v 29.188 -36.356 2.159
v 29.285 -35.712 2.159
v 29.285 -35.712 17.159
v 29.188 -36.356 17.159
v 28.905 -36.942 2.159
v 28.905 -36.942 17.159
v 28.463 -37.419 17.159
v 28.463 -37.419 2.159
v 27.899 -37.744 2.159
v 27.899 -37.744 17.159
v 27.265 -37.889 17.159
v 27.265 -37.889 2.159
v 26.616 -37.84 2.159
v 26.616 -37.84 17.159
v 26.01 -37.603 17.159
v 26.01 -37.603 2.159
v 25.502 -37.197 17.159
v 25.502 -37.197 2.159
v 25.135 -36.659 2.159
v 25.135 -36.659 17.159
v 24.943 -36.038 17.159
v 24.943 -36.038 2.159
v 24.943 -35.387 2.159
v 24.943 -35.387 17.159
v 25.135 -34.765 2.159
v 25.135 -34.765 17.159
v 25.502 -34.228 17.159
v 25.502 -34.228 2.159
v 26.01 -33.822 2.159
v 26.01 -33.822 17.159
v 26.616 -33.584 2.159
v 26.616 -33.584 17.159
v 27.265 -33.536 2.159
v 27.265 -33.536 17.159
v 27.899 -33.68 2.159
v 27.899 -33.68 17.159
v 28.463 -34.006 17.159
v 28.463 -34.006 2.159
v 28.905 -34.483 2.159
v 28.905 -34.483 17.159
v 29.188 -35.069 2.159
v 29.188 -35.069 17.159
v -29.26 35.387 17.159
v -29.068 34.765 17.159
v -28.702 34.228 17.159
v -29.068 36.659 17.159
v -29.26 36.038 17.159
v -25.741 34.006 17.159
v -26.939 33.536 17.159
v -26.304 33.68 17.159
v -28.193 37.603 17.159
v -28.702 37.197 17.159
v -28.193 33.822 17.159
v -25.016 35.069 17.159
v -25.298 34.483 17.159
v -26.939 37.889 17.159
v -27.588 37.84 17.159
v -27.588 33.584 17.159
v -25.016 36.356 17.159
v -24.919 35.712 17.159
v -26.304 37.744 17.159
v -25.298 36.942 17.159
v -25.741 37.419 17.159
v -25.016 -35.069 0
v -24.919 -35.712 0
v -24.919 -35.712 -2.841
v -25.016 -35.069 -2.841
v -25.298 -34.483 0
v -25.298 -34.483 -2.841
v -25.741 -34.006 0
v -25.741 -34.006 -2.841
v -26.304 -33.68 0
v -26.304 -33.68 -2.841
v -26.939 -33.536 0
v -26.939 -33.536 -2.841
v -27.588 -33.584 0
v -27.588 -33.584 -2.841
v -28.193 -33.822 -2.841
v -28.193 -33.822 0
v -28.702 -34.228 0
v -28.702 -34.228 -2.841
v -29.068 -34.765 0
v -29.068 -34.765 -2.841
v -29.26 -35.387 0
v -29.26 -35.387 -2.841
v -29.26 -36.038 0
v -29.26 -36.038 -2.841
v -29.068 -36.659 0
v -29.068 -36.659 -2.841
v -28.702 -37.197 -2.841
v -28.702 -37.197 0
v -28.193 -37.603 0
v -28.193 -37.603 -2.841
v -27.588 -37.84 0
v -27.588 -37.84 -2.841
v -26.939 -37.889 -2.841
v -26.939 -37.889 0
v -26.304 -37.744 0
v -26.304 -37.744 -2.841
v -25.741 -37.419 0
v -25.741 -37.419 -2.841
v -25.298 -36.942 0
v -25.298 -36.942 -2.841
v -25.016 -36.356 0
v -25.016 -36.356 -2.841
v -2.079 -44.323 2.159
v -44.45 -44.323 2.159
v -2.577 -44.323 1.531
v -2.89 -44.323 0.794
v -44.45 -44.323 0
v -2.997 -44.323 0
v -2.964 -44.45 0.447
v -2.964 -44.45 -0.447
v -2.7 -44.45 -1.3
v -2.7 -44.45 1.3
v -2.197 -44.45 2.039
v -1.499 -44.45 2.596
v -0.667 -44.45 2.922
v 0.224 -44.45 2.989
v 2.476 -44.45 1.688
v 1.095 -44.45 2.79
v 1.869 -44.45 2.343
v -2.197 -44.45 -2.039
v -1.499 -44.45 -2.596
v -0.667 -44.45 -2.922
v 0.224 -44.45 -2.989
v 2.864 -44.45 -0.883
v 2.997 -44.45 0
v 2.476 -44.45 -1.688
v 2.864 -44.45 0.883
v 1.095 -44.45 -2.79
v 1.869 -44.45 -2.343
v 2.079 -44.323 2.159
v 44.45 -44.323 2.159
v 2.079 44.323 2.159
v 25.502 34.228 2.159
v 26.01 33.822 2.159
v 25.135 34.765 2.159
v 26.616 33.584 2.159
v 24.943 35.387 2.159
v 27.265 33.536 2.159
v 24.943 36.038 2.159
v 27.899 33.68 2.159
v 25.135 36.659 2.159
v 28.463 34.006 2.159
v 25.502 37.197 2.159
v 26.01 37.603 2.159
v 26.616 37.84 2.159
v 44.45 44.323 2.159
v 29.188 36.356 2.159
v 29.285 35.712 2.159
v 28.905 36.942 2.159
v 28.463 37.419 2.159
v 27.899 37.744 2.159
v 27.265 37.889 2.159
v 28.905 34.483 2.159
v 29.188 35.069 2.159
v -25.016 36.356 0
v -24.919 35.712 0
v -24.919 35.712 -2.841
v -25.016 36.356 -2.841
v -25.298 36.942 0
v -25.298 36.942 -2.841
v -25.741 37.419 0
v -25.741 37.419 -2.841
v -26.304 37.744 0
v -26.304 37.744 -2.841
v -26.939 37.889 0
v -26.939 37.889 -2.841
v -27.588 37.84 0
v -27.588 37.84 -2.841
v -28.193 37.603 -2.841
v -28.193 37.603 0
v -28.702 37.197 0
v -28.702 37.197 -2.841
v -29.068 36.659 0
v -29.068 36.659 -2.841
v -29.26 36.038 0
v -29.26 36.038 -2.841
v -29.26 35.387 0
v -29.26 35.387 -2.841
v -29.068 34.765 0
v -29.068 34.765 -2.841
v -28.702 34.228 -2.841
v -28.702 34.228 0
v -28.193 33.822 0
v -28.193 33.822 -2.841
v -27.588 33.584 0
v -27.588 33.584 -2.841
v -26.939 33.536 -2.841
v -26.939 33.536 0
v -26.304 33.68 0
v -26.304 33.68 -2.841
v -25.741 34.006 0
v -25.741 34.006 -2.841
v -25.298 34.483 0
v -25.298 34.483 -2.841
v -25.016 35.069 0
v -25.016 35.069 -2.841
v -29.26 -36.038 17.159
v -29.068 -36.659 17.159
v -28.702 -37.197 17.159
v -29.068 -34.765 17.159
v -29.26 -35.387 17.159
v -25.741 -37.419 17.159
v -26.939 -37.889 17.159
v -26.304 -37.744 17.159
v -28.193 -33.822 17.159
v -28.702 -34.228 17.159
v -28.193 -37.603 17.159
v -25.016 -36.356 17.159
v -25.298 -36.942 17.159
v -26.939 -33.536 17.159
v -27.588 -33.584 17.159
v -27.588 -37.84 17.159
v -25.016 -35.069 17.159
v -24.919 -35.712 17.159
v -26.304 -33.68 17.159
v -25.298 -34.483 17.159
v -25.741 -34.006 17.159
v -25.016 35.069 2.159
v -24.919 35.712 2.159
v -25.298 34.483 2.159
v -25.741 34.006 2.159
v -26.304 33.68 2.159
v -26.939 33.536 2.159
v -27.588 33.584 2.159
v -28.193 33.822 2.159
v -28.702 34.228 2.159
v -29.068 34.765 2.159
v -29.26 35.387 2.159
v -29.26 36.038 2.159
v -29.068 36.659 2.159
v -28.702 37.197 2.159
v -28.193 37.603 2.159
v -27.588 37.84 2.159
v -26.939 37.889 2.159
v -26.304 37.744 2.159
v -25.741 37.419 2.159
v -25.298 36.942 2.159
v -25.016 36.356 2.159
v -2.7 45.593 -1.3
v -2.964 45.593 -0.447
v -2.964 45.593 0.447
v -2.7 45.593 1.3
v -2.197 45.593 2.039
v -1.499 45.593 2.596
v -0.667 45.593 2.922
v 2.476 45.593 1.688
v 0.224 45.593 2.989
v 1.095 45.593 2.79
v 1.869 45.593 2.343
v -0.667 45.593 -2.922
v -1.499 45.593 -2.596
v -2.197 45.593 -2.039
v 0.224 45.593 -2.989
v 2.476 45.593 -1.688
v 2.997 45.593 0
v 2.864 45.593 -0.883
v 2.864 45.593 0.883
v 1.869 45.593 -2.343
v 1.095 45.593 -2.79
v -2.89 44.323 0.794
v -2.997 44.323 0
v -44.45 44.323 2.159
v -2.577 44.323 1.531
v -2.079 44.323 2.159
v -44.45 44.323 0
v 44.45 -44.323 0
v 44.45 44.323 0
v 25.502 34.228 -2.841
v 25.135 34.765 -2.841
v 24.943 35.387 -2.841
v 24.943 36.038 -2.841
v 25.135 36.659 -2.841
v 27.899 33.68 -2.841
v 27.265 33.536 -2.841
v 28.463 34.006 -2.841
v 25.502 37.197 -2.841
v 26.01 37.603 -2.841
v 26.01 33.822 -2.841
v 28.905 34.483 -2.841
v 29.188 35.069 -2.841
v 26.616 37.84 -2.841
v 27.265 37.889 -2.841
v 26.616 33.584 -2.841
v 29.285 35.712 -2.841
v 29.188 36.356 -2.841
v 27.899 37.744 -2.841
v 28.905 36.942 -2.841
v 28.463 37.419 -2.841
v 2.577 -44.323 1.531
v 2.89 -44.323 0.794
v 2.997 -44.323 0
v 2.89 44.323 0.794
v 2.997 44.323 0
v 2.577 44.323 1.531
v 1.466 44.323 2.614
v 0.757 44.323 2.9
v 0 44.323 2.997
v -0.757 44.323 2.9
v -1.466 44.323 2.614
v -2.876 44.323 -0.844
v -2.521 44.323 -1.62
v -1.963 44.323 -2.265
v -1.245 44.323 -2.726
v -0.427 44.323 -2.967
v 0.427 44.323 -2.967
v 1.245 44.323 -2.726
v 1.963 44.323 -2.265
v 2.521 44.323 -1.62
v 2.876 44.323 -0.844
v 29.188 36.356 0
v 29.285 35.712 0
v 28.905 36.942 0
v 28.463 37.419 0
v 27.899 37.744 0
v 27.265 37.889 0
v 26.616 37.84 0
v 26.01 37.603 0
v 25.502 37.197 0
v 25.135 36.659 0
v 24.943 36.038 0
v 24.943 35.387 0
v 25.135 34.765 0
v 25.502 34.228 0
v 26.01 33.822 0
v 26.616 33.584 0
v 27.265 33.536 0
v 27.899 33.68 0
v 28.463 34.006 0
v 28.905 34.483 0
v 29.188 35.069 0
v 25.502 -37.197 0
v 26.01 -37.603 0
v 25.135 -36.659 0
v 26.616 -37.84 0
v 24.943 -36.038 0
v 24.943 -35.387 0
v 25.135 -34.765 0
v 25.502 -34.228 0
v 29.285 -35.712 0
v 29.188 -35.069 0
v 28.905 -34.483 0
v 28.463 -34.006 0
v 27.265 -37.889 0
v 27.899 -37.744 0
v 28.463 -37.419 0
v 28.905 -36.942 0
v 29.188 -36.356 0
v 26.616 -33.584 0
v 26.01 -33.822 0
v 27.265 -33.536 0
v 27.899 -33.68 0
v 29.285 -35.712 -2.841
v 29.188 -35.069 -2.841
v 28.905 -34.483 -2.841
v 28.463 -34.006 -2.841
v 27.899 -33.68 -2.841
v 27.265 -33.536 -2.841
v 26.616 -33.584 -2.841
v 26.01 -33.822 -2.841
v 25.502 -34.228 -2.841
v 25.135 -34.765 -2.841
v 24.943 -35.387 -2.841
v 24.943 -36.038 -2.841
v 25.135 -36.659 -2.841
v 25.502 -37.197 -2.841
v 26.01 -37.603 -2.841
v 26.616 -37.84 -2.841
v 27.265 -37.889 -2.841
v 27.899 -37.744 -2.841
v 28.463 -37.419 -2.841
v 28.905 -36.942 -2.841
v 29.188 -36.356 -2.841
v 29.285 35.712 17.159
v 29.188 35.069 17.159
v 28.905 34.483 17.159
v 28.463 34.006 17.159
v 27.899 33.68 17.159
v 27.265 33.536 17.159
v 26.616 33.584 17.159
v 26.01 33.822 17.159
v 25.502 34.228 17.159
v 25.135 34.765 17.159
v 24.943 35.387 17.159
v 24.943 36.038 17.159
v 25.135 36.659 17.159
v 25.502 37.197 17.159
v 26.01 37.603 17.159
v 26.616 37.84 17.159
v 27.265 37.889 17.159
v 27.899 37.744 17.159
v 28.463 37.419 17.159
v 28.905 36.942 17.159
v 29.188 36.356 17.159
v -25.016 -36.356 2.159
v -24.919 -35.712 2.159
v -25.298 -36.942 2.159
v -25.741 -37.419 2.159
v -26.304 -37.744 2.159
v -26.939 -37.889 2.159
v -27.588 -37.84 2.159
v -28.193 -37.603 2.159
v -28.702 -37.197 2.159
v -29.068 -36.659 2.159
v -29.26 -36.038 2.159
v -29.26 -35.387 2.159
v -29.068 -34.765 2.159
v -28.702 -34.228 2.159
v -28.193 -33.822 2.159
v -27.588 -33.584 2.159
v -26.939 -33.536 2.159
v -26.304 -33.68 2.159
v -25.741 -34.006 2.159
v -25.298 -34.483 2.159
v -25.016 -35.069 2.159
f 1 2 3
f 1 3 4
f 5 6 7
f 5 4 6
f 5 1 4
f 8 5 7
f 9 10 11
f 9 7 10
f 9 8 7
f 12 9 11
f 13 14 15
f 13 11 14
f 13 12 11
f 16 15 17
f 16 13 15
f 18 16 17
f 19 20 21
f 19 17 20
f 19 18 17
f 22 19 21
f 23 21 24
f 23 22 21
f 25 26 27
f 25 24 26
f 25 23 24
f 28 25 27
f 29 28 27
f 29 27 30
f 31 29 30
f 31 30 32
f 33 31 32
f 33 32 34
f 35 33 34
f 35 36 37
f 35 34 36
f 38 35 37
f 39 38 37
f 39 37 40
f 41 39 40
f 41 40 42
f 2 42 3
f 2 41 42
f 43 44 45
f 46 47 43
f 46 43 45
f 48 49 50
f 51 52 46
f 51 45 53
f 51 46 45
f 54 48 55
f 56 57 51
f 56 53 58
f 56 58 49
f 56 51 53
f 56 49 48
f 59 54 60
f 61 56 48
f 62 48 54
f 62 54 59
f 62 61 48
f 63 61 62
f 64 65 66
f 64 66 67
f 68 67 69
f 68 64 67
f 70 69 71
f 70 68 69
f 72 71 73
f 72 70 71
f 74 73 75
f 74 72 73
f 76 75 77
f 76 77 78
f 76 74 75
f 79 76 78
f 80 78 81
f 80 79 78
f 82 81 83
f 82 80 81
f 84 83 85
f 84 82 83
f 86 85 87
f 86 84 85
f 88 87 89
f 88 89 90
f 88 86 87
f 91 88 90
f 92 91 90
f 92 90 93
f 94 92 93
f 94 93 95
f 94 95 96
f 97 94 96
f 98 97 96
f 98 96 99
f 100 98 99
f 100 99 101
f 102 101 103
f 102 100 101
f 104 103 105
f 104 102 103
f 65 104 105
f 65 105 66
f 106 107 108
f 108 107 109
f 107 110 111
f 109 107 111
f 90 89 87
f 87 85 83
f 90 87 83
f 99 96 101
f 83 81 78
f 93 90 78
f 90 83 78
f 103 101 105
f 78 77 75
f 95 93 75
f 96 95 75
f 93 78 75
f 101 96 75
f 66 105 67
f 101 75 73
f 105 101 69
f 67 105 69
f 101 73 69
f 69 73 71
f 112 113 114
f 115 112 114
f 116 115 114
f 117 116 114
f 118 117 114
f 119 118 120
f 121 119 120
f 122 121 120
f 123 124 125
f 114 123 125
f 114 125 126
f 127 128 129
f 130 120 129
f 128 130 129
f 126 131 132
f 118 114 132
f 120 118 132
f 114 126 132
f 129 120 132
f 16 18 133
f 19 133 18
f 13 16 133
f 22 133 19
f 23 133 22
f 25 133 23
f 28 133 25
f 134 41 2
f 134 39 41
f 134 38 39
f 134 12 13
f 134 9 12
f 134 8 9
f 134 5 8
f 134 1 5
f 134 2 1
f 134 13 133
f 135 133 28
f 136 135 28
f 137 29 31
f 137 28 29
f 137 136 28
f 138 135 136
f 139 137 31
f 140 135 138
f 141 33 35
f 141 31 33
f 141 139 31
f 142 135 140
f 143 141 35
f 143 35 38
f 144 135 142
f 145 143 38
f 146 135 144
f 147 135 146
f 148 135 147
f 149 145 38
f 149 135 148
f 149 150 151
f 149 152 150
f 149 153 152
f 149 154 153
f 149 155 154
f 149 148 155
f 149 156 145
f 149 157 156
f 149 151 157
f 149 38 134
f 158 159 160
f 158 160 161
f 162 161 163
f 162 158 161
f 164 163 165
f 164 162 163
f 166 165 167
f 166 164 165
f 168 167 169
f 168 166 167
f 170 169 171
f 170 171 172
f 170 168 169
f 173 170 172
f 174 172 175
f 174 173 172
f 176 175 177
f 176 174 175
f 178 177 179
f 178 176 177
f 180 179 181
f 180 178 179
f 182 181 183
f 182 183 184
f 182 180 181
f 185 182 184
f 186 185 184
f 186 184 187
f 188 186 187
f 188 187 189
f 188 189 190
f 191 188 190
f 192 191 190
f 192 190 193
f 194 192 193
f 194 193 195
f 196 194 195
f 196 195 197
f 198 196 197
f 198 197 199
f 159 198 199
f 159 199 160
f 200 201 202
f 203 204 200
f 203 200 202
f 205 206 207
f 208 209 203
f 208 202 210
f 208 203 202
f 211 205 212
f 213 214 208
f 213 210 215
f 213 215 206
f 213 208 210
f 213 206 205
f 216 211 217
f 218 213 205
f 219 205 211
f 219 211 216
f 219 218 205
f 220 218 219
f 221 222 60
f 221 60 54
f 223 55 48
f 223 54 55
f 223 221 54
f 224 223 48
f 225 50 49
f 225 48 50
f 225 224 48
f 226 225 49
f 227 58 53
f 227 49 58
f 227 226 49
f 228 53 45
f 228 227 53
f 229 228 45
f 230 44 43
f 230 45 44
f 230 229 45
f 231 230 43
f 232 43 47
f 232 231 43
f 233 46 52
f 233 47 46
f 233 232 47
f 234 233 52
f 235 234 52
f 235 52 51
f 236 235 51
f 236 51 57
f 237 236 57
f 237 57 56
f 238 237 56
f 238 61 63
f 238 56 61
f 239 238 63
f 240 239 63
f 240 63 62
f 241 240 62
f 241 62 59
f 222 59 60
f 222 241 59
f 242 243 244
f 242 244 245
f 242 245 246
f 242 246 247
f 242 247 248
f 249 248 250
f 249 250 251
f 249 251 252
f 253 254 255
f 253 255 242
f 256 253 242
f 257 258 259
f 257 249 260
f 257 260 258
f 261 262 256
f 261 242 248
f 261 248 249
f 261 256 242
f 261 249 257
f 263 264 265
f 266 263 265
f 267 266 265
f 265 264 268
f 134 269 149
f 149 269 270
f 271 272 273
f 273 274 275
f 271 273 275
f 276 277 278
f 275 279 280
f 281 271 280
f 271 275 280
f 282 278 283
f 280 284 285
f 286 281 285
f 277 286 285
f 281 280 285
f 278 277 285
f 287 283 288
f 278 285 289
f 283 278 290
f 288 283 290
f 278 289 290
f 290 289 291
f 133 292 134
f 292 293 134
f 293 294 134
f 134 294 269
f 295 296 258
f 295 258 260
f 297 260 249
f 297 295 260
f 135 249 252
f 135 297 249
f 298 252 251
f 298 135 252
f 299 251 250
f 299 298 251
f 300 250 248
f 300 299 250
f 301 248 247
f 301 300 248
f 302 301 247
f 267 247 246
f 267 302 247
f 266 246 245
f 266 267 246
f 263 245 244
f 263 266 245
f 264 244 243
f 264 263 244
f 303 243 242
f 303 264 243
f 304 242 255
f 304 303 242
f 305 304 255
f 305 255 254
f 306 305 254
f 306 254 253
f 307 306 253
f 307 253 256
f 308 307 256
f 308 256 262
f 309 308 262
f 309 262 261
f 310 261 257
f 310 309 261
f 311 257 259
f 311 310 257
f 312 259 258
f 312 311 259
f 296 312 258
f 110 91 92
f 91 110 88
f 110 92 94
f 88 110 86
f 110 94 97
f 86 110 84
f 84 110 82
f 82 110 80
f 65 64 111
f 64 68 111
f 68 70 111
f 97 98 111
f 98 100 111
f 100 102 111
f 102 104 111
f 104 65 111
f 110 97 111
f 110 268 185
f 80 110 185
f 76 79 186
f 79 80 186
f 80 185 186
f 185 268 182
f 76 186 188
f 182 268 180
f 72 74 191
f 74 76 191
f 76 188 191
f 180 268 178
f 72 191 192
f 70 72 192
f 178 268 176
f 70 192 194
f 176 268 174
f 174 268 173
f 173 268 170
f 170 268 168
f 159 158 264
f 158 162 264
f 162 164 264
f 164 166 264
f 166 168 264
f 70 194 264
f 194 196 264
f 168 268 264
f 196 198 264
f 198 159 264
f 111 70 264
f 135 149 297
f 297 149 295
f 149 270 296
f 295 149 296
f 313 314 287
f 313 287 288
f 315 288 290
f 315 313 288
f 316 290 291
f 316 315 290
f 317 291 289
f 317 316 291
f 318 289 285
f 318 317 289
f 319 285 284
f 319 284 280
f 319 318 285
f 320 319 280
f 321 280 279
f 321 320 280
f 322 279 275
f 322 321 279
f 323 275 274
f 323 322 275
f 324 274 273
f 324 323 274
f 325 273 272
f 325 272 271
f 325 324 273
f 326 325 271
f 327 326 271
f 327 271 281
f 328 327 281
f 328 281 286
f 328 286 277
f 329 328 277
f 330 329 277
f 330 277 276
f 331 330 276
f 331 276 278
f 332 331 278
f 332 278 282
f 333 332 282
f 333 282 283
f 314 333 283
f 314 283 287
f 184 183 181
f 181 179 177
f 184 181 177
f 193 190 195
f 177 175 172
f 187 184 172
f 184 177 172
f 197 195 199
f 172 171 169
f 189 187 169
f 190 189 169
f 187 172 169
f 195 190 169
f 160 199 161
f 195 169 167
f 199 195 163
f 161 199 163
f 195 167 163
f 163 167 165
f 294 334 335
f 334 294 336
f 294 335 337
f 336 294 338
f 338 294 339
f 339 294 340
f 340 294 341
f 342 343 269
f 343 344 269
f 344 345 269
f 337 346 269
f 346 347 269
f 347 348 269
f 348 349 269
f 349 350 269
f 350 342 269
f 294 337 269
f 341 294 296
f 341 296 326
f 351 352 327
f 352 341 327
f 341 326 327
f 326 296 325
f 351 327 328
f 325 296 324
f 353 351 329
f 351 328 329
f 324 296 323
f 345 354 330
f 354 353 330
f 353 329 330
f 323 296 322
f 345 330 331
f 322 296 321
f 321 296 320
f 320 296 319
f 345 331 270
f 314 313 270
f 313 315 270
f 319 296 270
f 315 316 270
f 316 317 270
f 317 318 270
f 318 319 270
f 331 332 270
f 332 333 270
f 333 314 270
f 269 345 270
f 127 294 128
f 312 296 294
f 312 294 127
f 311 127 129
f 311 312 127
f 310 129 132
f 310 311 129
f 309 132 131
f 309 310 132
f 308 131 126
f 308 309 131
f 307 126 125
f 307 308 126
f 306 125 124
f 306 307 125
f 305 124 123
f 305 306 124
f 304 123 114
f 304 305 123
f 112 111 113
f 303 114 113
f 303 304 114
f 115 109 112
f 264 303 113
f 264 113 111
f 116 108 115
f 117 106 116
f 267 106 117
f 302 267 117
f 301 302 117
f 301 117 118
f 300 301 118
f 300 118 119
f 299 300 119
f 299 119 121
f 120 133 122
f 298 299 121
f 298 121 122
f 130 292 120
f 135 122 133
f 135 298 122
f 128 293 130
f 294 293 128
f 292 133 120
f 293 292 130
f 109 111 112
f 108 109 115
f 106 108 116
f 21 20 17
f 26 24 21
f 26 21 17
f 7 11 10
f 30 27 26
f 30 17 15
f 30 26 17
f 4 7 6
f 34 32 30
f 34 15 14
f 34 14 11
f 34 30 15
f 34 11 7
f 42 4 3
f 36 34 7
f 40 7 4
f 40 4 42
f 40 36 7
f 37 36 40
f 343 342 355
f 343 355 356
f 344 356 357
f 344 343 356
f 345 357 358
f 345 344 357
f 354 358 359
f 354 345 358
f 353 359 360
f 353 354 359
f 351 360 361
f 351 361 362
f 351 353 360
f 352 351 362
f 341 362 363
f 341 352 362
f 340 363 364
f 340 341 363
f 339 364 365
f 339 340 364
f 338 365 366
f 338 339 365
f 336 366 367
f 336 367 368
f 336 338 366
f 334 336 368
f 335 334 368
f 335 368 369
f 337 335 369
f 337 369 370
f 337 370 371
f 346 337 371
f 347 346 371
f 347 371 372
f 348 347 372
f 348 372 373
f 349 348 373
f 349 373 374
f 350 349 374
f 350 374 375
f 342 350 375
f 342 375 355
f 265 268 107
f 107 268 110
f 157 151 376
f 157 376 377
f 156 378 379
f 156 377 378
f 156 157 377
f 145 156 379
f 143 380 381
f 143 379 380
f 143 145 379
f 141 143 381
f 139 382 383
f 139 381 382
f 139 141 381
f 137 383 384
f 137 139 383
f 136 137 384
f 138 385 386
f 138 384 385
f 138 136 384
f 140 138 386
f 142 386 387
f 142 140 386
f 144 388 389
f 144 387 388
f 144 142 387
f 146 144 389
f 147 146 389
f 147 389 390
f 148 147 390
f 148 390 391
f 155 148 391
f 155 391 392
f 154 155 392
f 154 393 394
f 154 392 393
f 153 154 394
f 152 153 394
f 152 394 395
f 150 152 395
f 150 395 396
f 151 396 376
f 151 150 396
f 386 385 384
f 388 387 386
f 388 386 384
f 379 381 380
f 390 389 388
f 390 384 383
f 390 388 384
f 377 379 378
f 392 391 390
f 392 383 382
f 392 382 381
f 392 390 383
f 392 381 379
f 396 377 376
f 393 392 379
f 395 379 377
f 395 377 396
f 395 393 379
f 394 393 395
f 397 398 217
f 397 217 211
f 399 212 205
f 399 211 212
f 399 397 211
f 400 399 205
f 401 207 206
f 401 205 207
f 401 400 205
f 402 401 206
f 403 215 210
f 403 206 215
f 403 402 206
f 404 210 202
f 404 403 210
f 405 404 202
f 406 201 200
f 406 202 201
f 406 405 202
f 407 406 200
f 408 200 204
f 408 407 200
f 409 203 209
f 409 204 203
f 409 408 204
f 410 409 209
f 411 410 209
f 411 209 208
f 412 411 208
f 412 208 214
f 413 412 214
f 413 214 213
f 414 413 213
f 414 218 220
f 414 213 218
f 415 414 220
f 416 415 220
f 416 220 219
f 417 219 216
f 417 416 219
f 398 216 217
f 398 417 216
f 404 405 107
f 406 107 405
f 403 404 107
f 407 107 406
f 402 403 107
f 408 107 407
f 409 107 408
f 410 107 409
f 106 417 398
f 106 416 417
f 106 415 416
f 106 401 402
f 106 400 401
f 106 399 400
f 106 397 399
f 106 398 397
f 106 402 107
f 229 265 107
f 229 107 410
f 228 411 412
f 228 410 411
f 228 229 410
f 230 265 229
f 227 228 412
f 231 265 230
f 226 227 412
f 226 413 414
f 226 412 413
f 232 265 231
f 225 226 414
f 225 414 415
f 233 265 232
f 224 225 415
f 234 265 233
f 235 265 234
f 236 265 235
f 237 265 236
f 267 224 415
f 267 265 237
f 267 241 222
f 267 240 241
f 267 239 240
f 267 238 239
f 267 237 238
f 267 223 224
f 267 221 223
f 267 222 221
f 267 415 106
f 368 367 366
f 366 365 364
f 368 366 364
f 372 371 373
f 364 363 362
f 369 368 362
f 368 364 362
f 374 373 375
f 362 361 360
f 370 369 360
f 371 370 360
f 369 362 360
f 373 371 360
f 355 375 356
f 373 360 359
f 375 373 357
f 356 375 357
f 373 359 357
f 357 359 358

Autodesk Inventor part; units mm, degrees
ref_plane "YZ Plane" through (0, 0, 0) normal (1, 0, 0) x (0, 1, 0)
ref_plane "XZ Plane" through (0, 0, 0) normal (0, 1, 0) x (-1, 0, 0)
ref_plane "XY Plane" through (0, 0, 0) normal (0, 0, 1) x (1, 0, 0)
sketch "Sketch1" plane through (0, 0, 0) normal (0, 0, 1) x (1, 0, 0)
  line L0 (-44.45, -44.323) -> (44.45, -44.323)
  line L1 (44.45, -44.323) -> (44.45, 44.323)
  line L2 (44.45, 44.323) -> (-44.45, 44.323)
  line L3 (-44.45, 44.323) -> (-44.45, -44.323)
  line L4 (-44.45, -44.323) -> (44.45, 44.323) construction
  line L5 (44.45, -44.323) -> (-44.45, 44.323) construction
  point P0 (0, 0)
  dimension "d0" = 88.9
  dimension "d1" = 88.646
extrude "Extrusion1" add sketch "Sketch1" along normal blind 2.159
sketch "Sketch3" plane through (-44.45, 44.323, 0) normal (0, 1, 0) x (1, 0, 0)
  circle A0 centre (44.45, 0) radius 2.9972
  dimension "d4" = 5.9944
extrude "Extrusion2" add sketch "Sketch3" along normal blind 1.27 and the other way blind 88.773
sketch "Sketch4" plane through (0, 0, 2.159) normal (0, 0, 1) x (1, 0, 0)
  circle A0 centre (-27.1018, 35.7124) radius 2.1828
  line L0 (-44.45, 44.323) -> (-44.45, -44.323) projected
  line L1 (-2.0789, 44.323) -> (-44.45, 44.323) projected
  line L2 (-44.45, 0) -> (0, 0)
  circle A1 centre (-27.1018, -35.7124) radius 2.1828
  line L3 (-2.9972, -44.45) -> (2.9972, -44.45) projected
  line L4 (0, -44.45) -> (0, 45.593)
  line L5 (2.9972, 45.593) -> (-2.9972, 45.593) projected
  circle A2 centre (27.1018, 35.7124) radius 2.1828
  circle A3 centre (27.1018, -35.7124) radius 2.1828
  dimension "d9" = 17.3482
  dimension "d10" = 4.3656
  dimension "d11" = 8.6106
extrude "Extrusion3" add sketch "Sketch4" along normal blind 15 and the other way blind 5
properties part number "Hinge"
